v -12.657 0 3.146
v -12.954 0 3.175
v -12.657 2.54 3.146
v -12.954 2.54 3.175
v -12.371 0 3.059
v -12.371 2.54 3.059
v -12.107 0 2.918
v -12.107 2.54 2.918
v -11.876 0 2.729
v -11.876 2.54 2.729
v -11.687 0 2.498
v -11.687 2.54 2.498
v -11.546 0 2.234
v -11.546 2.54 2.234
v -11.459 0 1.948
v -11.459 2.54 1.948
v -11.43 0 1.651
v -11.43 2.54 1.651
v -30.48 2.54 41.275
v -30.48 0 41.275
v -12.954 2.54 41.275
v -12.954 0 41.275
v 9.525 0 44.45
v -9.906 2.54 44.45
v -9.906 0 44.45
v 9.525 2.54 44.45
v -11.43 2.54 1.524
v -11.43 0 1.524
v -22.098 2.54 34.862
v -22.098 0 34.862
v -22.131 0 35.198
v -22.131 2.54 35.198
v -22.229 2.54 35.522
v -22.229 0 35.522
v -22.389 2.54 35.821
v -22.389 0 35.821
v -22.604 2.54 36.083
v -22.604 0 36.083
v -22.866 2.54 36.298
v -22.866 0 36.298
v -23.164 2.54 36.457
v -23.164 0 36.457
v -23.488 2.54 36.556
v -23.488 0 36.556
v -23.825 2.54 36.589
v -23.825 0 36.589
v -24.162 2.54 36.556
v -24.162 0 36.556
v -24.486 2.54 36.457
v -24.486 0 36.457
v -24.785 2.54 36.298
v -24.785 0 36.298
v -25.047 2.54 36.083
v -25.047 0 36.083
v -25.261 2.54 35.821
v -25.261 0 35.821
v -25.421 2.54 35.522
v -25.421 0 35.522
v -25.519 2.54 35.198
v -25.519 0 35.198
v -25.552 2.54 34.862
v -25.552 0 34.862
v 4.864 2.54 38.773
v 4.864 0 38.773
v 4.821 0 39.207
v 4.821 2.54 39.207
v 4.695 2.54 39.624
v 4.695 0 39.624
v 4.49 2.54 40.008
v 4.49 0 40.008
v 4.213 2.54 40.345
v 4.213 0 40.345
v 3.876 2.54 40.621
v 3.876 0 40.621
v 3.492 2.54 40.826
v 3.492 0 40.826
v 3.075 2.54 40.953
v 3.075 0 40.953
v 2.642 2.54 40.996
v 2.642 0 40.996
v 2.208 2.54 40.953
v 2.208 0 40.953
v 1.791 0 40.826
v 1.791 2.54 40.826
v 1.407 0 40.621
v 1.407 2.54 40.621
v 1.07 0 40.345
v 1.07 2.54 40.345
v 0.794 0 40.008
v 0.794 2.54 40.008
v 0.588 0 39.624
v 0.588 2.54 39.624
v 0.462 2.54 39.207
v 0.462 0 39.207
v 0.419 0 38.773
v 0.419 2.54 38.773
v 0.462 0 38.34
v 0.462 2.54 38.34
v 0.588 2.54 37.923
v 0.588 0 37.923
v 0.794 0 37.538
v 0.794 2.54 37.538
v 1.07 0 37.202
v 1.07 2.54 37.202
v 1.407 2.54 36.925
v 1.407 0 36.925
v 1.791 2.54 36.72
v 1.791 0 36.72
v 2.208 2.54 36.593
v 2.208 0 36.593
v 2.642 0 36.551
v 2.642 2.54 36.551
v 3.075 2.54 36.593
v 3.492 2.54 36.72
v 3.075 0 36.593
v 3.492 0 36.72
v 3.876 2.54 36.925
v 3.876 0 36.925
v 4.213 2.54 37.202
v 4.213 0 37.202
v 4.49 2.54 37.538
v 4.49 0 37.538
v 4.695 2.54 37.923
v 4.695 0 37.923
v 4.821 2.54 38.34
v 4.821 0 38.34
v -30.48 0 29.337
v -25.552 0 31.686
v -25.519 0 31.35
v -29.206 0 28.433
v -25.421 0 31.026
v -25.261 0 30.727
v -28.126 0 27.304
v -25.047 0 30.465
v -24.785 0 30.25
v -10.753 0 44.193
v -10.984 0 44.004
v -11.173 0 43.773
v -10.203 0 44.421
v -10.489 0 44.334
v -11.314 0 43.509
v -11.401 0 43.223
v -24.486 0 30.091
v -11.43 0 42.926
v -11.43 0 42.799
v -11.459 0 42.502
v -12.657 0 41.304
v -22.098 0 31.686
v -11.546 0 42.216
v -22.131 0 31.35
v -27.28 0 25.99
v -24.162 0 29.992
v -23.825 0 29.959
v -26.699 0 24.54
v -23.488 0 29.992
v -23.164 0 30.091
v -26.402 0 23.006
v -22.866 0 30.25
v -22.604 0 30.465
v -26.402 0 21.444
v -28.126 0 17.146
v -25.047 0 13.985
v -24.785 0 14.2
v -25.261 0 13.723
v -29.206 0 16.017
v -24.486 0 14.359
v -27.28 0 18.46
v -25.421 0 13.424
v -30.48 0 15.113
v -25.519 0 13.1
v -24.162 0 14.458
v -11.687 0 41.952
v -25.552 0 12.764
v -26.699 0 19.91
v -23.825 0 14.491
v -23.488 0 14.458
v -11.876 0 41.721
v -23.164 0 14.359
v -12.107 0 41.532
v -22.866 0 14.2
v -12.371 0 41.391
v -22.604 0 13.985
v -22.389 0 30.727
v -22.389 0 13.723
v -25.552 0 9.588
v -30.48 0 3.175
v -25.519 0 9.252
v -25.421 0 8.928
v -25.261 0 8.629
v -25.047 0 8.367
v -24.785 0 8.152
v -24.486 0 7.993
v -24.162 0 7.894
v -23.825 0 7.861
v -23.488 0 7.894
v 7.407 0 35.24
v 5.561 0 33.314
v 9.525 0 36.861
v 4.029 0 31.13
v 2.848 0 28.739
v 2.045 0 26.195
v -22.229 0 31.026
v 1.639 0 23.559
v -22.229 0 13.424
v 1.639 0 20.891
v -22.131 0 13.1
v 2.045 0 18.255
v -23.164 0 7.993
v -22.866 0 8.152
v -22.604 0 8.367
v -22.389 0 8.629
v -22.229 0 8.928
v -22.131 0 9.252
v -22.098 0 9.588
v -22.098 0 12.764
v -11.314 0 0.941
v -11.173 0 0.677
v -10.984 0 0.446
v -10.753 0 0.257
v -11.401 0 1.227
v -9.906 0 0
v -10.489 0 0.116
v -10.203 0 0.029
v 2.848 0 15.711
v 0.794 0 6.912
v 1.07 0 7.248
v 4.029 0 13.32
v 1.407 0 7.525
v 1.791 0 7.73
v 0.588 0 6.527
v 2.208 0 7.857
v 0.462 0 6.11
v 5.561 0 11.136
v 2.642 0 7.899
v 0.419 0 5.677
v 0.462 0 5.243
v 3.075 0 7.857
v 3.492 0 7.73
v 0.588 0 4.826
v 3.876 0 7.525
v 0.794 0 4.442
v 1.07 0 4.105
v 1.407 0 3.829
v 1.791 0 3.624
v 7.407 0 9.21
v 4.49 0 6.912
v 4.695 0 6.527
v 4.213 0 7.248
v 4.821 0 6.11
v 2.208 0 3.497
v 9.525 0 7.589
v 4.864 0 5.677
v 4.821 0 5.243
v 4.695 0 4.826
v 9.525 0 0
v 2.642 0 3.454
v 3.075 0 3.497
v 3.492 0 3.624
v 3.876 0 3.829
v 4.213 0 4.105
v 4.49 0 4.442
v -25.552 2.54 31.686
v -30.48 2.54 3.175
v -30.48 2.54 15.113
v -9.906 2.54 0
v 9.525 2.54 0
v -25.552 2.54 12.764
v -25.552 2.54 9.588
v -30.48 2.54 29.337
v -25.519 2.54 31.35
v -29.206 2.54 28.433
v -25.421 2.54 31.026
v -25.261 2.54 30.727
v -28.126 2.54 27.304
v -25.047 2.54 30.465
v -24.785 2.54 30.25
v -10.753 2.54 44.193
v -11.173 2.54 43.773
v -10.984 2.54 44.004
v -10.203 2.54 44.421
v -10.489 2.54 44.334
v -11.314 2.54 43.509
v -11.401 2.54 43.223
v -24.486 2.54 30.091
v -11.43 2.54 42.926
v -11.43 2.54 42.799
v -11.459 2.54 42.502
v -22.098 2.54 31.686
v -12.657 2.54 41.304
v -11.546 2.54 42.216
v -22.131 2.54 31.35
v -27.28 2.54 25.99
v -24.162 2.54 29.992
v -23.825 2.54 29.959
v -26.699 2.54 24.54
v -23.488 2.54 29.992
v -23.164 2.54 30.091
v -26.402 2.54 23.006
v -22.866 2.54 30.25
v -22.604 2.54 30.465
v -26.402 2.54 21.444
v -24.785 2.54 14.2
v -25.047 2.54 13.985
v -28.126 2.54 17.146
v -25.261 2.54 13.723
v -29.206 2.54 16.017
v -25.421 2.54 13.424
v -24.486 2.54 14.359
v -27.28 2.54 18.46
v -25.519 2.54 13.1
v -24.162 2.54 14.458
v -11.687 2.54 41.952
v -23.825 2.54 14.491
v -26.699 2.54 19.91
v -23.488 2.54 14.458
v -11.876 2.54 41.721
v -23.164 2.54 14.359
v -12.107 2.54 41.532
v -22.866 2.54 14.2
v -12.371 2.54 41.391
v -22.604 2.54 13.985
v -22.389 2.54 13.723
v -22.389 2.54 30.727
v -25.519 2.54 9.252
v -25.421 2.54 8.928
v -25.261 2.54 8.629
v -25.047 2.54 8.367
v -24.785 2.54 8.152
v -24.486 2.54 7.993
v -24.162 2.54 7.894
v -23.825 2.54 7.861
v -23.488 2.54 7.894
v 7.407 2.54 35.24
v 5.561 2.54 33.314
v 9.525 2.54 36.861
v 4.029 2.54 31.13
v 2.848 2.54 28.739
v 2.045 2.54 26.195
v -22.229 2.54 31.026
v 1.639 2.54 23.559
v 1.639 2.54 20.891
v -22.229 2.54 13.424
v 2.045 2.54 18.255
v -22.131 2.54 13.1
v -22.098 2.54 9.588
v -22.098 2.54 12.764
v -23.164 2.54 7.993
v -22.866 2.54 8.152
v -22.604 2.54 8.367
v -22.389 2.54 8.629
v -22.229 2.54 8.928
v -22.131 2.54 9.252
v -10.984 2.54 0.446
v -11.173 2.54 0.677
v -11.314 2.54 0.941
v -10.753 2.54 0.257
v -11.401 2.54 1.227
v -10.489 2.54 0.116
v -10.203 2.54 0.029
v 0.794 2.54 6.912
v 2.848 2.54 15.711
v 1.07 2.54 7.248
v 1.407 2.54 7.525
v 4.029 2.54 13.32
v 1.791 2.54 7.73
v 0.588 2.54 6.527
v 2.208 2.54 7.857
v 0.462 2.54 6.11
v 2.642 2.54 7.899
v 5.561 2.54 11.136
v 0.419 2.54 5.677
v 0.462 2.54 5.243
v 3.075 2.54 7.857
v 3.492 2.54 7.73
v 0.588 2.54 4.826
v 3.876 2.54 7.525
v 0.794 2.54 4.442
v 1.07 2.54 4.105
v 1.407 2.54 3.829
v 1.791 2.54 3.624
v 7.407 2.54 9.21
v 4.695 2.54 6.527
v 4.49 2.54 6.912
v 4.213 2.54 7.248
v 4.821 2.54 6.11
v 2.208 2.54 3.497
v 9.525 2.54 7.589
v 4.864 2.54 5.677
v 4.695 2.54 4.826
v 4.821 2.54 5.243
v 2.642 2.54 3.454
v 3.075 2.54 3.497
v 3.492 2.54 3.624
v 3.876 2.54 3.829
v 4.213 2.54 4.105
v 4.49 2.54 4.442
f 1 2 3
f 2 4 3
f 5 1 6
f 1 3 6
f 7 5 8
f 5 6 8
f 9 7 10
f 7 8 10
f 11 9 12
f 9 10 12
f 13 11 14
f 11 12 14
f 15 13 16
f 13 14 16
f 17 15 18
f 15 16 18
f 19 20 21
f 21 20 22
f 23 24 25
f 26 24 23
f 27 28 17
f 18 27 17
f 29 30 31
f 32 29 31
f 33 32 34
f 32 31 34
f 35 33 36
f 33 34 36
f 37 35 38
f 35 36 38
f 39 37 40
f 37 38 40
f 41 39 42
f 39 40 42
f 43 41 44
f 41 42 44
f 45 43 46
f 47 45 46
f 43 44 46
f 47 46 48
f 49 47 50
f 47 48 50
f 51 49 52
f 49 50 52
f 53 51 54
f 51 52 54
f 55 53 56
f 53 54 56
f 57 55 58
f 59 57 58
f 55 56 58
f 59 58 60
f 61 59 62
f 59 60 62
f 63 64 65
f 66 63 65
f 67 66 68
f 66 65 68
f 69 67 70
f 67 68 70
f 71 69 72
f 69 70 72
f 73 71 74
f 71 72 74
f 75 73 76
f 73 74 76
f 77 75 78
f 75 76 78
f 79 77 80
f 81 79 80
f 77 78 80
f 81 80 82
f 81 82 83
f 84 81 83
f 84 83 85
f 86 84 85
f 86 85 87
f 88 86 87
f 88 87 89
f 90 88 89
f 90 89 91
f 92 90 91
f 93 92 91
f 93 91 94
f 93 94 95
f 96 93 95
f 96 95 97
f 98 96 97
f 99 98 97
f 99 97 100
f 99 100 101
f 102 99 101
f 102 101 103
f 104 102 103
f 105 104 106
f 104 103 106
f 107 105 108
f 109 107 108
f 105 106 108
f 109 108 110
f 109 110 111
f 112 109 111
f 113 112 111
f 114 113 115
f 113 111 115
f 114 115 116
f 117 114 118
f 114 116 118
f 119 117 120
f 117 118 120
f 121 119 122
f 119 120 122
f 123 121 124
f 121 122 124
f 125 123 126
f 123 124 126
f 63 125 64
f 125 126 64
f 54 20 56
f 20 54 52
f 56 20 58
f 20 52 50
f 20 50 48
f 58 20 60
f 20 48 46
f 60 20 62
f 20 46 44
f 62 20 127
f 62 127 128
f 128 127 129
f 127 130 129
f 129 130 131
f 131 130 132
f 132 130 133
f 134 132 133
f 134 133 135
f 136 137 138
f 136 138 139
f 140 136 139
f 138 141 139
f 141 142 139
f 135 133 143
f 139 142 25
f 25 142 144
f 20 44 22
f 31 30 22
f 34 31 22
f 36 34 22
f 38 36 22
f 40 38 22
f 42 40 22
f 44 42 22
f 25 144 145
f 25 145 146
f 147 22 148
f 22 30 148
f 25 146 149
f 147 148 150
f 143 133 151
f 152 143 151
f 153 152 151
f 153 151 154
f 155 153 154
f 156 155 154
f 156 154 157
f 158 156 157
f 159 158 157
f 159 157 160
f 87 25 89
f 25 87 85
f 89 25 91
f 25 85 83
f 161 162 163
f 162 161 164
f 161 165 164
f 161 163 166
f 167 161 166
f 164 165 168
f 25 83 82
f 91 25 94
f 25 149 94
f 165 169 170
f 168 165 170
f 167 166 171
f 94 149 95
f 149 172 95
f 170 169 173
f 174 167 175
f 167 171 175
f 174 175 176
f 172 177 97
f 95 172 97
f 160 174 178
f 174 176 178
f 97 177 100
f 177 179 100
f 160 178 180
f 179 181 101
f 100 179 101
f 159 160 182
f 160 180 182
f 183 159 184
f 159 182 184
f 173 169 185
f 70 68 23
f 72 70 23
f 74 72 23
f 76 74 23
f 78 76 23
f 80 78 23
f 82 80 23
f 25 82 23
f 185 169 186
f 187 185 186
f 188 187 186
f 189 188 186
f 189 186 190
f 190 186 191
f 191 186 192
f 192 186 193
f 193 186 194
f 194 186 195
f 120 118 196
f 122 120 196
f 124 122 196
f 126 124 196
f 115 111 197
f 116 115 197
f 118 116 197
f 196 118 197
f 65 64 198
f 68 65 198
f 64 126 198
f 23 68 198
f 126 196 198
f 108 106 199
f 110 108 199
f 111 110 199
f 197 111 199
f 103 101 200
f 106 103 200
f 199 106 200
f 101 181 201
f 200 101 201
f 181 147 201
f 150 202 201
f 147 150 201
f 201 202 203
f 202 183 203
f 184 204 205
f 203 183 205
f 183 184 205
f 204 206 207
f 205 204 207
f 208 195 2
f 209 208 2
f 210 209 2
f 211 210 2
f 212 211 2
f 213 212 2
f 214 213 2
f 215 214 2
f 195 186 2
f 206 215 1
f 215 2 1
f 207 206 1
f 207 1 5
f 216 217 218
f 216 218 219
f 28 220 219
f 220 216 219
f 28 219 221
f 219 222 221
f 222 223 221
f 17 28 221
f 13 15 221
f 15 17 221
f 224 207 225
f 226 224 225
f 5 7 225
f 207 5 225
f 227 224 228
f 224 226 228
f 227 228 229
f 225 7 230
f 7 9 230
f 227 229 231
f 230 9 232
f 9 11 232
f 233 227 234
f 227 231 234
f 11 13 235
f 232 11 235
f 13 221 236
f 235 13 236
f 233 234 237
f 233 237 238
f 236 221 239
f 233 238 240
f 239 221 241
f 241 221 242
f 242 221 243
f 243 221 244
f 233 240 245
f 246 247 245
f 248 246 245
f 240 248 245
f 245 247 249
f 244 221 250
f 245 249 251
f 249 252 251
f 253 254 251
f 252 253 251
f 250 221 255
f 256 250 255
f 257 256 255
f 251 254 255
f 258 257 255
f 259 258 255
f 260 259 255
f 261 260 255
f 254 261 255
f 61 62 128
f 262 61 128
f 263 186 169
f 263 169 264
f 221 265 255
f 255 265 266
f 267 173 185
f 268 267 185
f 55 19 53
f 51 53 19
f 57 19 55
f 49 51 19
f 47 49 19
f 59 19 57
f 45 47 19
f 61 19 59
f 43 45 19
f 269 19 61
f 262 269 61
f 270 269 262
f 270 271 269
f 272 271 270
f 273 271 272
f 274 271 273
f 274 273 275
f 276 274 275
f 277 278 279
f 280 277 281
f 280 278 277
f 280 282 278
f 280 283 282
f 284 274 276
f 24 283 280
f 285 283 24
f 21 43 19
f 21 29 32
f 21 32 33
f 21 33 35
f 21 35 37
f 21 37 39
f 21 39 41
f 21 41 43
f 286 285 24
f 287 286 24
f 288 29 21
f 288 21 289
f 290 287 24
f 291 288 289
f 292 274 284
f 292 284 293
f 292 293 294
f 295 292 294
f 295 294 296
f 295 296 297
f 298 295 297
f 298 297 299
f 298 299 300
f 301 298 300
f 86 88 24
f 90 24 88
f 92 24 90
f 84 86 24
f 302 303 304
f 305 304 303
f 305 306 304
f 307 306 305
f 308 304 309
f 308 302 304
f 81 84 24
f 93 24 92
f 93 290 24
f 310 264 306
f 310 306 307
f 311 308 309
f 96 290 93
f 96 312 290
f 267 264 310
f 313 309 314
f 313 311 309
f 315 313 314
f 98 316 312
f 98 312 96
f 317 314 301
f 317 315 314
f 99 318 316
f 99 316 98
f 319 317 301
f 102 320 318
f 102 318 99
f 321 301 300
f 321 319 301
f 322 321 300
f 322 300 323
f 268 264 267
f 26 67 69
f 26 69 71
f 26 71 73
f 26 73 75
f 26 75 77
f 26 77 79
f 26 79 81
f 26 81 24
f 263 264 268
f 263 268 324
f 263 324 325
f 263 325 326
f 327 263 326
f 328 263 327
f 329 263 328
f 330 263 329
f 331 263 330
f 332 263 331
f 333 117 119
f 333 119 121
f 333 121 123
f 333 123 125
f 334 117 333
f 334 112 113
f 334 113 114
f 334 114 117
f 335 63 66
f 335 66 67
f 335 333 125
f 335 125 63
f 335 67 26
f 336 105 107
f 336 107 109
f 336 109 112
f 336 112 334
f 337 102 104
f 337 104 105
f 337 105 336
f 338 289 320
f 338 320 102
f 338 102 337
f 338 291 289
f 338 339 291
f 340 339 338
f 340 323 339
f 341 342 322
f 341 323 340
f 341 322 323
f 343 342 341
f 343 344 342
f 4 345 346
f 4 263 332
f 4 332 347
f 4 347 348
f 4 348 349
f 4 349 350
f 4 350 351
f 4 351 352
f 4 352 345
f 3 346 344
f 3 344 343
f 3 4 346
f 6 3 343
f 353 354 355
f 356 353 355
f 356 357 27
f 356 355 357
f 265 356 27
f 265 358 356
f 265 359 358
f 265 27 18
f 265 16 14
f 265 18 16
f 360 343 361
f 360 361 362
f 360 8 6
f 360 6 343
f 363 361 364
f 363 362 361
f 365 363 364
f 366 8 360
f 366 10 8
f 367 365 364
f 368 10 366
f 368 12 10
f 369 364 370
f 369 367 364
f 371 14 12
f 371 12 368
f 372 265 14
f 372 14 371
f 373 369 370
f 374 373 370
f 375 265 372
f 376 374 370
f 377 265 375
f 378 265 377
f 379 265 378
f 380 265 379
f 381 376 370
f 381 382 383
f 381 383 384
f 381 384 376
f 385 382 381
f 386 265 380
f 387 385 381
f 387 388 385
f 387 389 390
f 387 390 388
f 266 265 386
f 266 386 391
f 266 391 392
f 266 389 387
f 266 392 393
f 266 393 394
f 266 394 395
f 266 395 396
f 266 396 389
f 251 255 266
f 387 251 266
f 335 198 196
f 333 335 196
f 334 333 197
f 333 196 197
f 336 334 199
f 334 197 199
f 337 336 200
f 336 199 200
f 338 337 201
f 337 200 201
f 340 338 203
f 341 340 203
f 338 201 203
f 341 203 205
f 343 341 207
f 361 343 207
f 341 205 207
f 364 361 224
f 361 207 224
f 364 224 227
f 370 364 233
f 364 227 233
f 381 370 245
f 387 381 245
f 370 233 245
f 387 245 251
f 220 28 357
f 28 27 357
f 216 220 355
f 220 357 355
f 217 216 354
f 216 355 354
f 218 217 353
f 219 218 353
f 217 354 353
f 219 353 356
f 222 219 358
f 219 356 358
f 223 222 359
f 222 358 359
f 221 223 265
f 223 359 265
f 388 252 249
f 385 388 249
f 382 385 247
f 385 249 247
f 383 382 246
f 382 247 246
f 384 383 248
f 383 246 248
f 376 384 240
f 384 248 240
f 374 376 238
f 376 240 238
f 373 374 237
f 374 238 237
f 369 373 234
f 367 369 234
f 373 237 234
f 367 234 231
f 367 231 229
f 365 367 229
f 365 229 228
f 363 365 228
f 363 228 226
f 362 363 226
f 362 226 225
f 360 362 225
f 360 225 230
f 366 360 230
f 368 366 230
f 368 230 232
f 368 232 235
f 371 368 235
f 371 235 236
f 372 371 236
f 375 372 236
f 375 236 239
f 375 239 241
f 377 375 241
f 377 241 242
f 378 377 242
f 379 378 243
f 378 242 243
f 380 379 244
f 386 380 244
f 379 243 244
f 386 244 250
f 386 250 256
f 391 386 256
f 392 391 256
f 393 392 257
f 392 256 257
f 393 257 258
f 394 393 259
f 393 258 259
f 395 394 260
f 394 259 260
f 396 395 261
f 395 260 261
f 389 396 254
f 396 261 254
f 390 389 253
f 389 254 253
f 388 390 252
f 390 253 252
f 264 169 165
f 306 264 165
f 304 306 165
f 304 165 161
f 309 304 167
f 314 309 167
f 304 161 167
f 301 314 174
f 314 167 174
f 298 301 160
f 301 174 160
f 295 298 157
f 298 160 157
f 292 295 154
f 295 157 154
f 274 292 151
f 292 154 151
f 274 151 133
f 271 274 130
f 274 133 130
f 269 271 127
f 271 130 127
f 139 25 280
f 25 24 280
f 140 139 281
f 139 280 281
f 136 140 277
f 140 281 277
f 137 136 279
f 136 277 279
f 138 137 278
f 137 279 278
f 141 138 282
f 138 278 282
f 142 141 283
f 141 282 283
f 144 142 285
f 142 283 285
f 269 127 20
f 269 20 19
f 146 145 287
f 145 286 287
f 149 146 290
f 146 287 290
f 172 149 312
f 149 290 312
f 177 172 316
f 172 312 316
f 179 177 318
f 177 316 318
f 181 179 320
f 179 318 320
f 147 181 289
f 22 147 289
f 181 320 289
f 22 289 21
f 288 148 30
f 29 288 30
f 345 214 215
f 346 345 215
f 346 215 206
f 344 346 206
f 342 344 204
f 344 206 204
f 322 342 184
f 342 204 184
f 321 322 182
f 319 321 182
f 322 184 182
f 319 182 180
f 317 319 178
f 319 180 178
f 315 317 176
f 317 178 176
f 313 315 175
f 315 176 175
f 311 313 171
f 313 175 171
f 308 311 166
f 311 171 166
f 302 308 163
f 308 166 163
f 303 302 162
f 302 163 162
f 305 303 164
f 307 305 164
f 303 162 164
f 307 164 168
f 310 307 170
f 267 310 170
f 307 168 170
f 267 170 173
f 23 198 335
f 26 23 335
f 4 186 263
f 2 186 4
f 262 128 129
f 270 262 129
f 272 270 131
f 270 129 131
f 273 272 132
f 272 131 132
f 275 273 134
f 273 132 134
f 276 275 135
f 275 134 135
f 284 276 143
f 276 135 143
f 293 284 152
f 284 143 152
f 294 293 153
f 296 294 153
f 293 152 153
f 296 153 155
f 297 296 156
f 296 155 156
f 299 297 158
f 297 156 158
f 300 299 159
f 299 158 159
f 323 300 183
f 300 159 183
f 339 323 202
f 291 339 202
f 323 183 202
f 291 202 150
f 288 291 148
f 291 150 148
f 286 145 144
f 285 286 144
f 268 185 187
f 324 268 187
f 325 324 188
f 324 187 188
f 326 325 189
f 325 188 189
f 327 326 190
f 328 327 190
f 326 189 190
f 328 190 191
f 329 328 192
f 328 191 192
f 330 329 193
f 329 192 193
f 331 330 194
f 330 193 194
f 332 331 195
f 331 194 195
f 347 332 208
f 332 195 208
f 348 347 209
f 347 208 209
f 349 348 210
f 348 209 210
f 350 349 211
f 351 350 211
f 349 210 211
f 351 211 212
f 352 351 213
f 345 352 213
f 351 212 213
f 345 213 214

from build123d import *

# Parameters (mm, degrees)
F0_W     = 30.48
F0_H     = 2.54
F1_DEPTH = 44.45
F0_W_2   = 9.525
F3_DEPTH = 44.45
F4_R     = 2.2225
F5_DEPTH = 25.4
F2_W     = 19.05
F2_H     = 3.175
F6_DEPTH = 25.4
F7_R     = 1.524


# Not quite as in the source:
# - a feature names something its author has since deleted; it is built from what else it names


with BuildPart() as f1:
    # F0 (on Top) → F1 (new body)
    with BuildSketch(Plane.XY):
        with Locations((-15.24, 1.27)):
            Rectangle(F0_W, F0_H)
    extrude(amount=F1_DEPTH)

    # F0 (on Top) → F3 (join)
    with BuildSketch(Plane.XY):
        with Locations((4.7625, 1.27)):
            Rectangle(F0_W_2, F0_H)
    extrude(amount=F3_DEPTH)

    # F4 (on face) + F2 (on face) → F5 (cut)
    with BuildSketch(Plane.XZ):
        with Locations((2.6416, 38.7731)):
            Circle(F4_R)
        with Locations((2.6416, 5.6769)):
            Circle(F4_R)
        with BuildLine():
            Line((9.525, 7.588973174), (9.525, 36.861026826))
            ThreePointArc((9.525, 36.861026826), (1.5875, 22.225), (9.525, 7.588973174))
        make_face()
    with BuildSketch(Plane.XZ):
        with BuildLine():
            Line((-22.098, 9.5885), (-22.098, 12.7635))
            ThreePointArc((-22.098, 12.7635), (-23.8252, 14.4907), (-25.5524, 12.7635))
            Line((-25.5524, 12.7635), (-25.5524, 9.5885))
            ThreePointArc((-25.5524, 9.5885), (-23.8252, 7.8613), (-22.098, 9.5885))
        make_face()
        with BuildLine():
            Line((-22.098, 31.6865), (-22.098, 34.8615))
            ThreePointArc((-22.098, 34.8615), (-23.8252, 36.5887), (-25.5524, 34.8615))
            Line((-25.5524, 34.8615), (-25.5524, 31.6865))
            ThreePointArc((-25.5524, 31.6865), (-23.8252, 29.9593), (-22.098, 31.6865))
        make_face()
        with BuildLine():
            Line((-30.48, 29.337), (-30.48, 15.113))
            ThreePointArc((-30.48, 15.113), (-26.3652, 22.225), (-30.48, 29.337))
        make_face()
    extrude(amount=-F5_DEPTH, mode=Mode.SUBTRACT)

    # F2 (on face) → F6 (cut)
    with BuildSketch(Plane.XZ):
        with Locations((-20.955, 42.8625)):
            Rectangle(F2_W, F2_H)
        with Locations((-20.955, 1.5875)):
            Rectangle(F2_W, F2_H)
    extrude(amount=-F6_DEPTH, mode=Mode.SUBTRACT)

    # F7
    f7_edges = [f1.edges().sort_by_distance(p)[0] for p in [
        (-11.43, 1.27, 41.275),
        (-11.43, 1.27, 44.45),
        (-11.43, 1.27, 0),
        (-11.43, 1.27, 3.175),
    ]]
    fillet(f7_edges, radius=F7_R)


solid = f1.part
